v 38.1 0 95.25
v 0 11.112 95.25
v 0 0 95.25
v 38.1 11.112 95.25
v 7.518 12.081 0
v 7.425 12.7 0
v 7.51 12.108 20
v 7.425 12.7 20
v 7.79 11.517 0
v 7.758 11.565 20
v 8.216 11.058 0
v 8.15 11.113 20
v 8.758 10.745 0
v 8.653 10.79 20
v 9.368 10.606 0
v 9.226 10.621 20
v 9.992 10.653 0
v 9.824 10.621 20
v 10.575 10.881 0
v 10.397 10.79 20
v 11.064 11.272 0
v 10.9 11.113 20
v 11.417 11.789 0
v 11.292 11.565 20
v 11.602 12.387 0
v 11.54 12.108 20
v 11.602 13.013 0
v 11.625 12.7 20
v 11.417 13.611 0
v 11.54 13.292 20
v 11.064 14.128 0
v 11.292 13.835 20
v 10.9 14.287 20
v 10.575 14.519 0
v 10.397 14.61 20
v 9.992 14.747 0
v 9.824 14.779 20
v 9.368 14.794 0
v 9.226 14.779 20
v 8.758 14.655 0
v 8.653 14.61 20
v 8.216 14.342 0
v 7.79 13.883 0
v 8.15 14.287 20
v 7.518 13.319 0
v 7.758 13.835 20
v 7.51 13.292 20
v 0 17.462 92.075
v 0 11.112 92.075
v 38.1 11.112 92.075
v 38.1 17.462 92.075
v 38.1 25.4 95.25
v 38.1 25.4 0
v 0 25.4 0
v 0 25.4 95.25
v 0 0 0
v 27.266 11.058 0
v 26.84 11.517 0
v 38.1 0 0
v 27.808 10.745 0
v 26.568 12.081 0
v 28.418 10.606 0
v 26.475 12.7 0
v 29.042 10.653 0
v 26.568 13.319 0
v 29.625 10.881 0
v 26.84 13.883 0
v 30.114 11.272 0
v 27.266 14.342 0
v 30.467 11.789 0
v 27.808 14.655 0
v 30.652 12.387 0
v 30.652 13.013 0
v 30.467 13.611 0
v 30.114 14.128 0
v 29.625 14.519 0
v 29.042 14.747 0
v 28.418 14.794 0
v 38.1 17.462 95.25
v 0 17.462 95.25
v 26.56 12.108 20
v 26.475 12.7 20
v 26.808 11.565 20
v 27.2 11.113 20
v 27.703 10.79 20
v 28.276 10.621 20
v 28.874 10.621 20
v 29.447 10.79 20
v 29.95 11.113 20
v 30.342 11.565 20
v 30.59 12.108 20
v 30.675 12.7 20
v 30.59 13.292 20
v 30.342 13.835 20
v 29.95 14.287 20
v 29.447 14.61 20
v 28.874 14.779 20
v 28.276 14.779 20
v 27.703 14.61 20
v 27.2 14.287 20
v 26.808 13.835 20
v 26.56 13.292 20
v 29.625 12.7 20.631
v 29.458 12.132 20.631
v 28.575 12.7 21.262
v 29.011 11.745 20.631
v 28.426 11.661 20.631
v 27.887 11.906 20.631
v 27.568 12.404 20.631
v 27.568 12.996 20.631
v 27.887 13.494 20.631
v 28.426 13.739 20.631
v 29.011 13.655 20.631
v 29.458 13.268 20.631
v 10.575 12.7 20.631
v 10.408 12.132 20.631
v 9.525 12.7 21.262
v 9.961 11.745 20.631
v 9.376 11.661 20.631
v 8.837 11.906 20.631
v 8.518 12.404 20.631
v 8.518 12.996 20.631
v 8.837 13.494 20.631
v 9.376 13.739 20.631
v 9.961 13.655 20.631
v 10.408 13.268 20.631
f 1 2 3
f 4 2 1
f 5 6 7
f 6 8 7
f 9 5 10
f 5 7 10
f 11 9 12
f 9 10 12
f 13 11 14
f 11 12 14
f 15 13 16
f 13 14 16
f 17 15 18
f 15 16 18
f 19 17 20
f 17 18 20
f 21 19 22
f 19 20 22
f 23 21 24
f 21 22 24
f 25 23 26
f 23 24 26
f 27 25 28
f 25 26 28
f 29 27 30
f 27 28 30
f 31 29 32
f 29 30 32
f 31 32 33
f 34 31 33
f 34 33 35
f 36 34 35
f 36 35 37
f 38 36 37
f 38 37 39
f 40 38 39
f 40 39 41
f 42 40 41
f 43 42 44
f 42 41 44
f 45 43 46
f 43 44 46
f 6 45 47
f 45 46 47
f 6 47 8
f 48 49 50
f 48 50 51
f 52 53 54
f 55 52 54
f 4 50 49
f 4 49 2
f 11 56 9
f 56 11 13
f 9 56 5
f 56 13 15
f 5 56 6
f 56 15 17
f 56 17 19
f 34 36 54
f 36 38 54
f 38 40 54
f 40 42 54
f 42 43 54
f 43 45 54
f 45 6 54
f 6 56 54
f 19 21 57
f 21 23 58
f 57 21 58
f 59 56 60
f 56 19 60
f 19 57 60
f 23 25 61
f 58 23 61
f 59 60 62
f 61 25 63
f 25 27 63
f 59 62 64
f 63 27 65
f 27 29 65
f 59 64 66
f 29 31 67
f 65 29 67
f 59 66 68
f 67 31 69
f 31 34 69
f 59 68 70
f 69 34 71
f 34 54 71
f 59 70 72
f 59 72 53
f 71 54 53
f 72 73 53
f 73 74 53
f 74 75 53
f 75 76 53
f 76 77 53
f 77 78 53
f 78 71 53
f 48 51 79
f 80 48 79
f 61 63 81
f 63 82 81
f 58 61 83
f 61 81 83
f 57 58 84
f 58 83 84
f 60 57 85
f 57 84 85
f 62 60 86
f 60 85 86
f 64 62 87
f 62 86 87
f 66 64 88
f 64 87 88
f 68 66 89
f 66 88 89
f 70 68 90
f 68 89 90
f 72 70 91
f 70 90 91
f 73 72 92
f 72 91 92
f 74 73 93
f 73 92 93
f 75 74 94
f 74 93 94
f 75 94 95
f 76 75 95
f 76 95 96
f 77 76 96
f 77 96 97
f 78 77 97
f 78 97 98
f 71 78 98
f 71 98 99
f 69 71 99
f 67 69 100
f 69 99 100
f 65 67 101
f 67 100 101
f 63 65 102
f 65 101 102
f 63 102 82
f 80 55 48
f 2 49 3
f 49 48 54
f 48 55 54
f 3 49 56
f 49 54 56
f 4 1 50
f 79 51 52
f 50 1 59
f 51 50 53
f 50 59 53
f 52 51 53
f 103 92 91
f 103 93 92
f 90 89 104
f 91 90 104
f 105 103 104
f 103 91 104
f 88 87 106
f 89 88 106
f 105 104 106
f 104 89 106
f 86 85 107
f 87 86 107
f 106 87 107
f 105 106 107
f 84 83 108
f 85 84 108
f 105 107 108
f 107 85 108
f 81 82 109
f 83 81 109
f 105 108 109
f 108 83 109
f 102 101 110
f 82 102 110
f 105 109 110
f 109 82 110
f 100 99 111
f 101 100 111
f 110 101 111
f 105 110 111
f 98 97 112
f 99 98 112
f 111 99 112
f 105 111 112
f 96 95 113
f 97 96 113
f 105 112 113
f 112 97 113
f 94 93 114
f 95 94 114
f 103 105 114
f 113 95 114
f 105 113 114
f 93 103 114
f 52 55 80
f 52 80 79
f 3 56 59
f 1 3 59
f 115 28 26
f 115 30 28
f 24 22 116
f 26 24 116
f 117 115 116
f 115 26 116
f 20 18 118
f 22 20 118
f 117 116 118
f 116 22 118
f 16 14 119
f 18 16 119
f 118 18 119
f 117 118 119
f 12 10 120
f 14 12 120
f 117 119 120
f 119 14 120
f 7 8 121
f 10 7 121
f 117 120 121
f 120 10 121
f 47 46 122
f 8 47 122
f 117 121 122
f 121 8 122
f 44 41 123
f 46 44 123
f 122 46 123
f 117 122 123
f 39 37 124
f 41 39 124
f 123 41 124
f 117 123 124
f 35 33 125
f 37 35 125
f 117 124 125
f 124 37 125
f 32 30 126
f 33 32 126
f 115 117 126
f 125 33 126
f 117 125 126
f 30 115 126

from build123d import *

# Parameters (mm, degrees)
F0_R     = 2.5
F1_DEPTH = 95.25
F2_W     = 6.35
F2_H     = 3.175
F3_DEPTH = 38.101
F4_D     = 4.2
F4_DEPTH = 20
F4_TIP   = 1.2618073


with BuildPart() as f1:
    # F0 (on Top) → F1 (new body)
    with BuildSketch(Plane.XY):
        Polygon((0, 0), (19.05, 0), (38.1, 0), (38.1, 25.4), (19.05, 25.4), (0, 25.4), align=None)
        with Locations((9.525, 12.7)):
            Circle(F0_R, mode=Mode.SUBTRACT)
        with Locations((28.575, 12.7)):
            Circle(F0_R, mode=Mode.SUBTRACT)
        with Locations((9.525, 12.7)):
            Circle(F0_R)
        with Locations((28.575, 12.7)):
            Circle(F0_R)
    extrude(amount=F1_DEPTH)

    # F2 (on face) → F3 (cut, through all)
    with BuildSketch(Plane.YZ.offset(38.1)):
        with Locations((14.2875, 93.6625)):
            Rectangle(F2_W, F2_H)
    extrude(amount=-F3_DEPTH, mode=Mode.SUBTRACT)

    # F4
    with Locations(Plane(origin=(0, 0, 0), x_dir=(1, 0, 0), z_dir=(0, 0, -1))):
        with Locations((9.525, -12.7), (28.575, -12.7)):
            Hole(F4_D / 2, depth=F4_DEPTH)
            with Locations((0, 0, -(F4_DEPTH + F4_TIP / 2))):  # 118° drill point
                Cone(0, F4_D / 2, F4_TIP, mode=Mode.SUBTRACT)


solid = f1.part
